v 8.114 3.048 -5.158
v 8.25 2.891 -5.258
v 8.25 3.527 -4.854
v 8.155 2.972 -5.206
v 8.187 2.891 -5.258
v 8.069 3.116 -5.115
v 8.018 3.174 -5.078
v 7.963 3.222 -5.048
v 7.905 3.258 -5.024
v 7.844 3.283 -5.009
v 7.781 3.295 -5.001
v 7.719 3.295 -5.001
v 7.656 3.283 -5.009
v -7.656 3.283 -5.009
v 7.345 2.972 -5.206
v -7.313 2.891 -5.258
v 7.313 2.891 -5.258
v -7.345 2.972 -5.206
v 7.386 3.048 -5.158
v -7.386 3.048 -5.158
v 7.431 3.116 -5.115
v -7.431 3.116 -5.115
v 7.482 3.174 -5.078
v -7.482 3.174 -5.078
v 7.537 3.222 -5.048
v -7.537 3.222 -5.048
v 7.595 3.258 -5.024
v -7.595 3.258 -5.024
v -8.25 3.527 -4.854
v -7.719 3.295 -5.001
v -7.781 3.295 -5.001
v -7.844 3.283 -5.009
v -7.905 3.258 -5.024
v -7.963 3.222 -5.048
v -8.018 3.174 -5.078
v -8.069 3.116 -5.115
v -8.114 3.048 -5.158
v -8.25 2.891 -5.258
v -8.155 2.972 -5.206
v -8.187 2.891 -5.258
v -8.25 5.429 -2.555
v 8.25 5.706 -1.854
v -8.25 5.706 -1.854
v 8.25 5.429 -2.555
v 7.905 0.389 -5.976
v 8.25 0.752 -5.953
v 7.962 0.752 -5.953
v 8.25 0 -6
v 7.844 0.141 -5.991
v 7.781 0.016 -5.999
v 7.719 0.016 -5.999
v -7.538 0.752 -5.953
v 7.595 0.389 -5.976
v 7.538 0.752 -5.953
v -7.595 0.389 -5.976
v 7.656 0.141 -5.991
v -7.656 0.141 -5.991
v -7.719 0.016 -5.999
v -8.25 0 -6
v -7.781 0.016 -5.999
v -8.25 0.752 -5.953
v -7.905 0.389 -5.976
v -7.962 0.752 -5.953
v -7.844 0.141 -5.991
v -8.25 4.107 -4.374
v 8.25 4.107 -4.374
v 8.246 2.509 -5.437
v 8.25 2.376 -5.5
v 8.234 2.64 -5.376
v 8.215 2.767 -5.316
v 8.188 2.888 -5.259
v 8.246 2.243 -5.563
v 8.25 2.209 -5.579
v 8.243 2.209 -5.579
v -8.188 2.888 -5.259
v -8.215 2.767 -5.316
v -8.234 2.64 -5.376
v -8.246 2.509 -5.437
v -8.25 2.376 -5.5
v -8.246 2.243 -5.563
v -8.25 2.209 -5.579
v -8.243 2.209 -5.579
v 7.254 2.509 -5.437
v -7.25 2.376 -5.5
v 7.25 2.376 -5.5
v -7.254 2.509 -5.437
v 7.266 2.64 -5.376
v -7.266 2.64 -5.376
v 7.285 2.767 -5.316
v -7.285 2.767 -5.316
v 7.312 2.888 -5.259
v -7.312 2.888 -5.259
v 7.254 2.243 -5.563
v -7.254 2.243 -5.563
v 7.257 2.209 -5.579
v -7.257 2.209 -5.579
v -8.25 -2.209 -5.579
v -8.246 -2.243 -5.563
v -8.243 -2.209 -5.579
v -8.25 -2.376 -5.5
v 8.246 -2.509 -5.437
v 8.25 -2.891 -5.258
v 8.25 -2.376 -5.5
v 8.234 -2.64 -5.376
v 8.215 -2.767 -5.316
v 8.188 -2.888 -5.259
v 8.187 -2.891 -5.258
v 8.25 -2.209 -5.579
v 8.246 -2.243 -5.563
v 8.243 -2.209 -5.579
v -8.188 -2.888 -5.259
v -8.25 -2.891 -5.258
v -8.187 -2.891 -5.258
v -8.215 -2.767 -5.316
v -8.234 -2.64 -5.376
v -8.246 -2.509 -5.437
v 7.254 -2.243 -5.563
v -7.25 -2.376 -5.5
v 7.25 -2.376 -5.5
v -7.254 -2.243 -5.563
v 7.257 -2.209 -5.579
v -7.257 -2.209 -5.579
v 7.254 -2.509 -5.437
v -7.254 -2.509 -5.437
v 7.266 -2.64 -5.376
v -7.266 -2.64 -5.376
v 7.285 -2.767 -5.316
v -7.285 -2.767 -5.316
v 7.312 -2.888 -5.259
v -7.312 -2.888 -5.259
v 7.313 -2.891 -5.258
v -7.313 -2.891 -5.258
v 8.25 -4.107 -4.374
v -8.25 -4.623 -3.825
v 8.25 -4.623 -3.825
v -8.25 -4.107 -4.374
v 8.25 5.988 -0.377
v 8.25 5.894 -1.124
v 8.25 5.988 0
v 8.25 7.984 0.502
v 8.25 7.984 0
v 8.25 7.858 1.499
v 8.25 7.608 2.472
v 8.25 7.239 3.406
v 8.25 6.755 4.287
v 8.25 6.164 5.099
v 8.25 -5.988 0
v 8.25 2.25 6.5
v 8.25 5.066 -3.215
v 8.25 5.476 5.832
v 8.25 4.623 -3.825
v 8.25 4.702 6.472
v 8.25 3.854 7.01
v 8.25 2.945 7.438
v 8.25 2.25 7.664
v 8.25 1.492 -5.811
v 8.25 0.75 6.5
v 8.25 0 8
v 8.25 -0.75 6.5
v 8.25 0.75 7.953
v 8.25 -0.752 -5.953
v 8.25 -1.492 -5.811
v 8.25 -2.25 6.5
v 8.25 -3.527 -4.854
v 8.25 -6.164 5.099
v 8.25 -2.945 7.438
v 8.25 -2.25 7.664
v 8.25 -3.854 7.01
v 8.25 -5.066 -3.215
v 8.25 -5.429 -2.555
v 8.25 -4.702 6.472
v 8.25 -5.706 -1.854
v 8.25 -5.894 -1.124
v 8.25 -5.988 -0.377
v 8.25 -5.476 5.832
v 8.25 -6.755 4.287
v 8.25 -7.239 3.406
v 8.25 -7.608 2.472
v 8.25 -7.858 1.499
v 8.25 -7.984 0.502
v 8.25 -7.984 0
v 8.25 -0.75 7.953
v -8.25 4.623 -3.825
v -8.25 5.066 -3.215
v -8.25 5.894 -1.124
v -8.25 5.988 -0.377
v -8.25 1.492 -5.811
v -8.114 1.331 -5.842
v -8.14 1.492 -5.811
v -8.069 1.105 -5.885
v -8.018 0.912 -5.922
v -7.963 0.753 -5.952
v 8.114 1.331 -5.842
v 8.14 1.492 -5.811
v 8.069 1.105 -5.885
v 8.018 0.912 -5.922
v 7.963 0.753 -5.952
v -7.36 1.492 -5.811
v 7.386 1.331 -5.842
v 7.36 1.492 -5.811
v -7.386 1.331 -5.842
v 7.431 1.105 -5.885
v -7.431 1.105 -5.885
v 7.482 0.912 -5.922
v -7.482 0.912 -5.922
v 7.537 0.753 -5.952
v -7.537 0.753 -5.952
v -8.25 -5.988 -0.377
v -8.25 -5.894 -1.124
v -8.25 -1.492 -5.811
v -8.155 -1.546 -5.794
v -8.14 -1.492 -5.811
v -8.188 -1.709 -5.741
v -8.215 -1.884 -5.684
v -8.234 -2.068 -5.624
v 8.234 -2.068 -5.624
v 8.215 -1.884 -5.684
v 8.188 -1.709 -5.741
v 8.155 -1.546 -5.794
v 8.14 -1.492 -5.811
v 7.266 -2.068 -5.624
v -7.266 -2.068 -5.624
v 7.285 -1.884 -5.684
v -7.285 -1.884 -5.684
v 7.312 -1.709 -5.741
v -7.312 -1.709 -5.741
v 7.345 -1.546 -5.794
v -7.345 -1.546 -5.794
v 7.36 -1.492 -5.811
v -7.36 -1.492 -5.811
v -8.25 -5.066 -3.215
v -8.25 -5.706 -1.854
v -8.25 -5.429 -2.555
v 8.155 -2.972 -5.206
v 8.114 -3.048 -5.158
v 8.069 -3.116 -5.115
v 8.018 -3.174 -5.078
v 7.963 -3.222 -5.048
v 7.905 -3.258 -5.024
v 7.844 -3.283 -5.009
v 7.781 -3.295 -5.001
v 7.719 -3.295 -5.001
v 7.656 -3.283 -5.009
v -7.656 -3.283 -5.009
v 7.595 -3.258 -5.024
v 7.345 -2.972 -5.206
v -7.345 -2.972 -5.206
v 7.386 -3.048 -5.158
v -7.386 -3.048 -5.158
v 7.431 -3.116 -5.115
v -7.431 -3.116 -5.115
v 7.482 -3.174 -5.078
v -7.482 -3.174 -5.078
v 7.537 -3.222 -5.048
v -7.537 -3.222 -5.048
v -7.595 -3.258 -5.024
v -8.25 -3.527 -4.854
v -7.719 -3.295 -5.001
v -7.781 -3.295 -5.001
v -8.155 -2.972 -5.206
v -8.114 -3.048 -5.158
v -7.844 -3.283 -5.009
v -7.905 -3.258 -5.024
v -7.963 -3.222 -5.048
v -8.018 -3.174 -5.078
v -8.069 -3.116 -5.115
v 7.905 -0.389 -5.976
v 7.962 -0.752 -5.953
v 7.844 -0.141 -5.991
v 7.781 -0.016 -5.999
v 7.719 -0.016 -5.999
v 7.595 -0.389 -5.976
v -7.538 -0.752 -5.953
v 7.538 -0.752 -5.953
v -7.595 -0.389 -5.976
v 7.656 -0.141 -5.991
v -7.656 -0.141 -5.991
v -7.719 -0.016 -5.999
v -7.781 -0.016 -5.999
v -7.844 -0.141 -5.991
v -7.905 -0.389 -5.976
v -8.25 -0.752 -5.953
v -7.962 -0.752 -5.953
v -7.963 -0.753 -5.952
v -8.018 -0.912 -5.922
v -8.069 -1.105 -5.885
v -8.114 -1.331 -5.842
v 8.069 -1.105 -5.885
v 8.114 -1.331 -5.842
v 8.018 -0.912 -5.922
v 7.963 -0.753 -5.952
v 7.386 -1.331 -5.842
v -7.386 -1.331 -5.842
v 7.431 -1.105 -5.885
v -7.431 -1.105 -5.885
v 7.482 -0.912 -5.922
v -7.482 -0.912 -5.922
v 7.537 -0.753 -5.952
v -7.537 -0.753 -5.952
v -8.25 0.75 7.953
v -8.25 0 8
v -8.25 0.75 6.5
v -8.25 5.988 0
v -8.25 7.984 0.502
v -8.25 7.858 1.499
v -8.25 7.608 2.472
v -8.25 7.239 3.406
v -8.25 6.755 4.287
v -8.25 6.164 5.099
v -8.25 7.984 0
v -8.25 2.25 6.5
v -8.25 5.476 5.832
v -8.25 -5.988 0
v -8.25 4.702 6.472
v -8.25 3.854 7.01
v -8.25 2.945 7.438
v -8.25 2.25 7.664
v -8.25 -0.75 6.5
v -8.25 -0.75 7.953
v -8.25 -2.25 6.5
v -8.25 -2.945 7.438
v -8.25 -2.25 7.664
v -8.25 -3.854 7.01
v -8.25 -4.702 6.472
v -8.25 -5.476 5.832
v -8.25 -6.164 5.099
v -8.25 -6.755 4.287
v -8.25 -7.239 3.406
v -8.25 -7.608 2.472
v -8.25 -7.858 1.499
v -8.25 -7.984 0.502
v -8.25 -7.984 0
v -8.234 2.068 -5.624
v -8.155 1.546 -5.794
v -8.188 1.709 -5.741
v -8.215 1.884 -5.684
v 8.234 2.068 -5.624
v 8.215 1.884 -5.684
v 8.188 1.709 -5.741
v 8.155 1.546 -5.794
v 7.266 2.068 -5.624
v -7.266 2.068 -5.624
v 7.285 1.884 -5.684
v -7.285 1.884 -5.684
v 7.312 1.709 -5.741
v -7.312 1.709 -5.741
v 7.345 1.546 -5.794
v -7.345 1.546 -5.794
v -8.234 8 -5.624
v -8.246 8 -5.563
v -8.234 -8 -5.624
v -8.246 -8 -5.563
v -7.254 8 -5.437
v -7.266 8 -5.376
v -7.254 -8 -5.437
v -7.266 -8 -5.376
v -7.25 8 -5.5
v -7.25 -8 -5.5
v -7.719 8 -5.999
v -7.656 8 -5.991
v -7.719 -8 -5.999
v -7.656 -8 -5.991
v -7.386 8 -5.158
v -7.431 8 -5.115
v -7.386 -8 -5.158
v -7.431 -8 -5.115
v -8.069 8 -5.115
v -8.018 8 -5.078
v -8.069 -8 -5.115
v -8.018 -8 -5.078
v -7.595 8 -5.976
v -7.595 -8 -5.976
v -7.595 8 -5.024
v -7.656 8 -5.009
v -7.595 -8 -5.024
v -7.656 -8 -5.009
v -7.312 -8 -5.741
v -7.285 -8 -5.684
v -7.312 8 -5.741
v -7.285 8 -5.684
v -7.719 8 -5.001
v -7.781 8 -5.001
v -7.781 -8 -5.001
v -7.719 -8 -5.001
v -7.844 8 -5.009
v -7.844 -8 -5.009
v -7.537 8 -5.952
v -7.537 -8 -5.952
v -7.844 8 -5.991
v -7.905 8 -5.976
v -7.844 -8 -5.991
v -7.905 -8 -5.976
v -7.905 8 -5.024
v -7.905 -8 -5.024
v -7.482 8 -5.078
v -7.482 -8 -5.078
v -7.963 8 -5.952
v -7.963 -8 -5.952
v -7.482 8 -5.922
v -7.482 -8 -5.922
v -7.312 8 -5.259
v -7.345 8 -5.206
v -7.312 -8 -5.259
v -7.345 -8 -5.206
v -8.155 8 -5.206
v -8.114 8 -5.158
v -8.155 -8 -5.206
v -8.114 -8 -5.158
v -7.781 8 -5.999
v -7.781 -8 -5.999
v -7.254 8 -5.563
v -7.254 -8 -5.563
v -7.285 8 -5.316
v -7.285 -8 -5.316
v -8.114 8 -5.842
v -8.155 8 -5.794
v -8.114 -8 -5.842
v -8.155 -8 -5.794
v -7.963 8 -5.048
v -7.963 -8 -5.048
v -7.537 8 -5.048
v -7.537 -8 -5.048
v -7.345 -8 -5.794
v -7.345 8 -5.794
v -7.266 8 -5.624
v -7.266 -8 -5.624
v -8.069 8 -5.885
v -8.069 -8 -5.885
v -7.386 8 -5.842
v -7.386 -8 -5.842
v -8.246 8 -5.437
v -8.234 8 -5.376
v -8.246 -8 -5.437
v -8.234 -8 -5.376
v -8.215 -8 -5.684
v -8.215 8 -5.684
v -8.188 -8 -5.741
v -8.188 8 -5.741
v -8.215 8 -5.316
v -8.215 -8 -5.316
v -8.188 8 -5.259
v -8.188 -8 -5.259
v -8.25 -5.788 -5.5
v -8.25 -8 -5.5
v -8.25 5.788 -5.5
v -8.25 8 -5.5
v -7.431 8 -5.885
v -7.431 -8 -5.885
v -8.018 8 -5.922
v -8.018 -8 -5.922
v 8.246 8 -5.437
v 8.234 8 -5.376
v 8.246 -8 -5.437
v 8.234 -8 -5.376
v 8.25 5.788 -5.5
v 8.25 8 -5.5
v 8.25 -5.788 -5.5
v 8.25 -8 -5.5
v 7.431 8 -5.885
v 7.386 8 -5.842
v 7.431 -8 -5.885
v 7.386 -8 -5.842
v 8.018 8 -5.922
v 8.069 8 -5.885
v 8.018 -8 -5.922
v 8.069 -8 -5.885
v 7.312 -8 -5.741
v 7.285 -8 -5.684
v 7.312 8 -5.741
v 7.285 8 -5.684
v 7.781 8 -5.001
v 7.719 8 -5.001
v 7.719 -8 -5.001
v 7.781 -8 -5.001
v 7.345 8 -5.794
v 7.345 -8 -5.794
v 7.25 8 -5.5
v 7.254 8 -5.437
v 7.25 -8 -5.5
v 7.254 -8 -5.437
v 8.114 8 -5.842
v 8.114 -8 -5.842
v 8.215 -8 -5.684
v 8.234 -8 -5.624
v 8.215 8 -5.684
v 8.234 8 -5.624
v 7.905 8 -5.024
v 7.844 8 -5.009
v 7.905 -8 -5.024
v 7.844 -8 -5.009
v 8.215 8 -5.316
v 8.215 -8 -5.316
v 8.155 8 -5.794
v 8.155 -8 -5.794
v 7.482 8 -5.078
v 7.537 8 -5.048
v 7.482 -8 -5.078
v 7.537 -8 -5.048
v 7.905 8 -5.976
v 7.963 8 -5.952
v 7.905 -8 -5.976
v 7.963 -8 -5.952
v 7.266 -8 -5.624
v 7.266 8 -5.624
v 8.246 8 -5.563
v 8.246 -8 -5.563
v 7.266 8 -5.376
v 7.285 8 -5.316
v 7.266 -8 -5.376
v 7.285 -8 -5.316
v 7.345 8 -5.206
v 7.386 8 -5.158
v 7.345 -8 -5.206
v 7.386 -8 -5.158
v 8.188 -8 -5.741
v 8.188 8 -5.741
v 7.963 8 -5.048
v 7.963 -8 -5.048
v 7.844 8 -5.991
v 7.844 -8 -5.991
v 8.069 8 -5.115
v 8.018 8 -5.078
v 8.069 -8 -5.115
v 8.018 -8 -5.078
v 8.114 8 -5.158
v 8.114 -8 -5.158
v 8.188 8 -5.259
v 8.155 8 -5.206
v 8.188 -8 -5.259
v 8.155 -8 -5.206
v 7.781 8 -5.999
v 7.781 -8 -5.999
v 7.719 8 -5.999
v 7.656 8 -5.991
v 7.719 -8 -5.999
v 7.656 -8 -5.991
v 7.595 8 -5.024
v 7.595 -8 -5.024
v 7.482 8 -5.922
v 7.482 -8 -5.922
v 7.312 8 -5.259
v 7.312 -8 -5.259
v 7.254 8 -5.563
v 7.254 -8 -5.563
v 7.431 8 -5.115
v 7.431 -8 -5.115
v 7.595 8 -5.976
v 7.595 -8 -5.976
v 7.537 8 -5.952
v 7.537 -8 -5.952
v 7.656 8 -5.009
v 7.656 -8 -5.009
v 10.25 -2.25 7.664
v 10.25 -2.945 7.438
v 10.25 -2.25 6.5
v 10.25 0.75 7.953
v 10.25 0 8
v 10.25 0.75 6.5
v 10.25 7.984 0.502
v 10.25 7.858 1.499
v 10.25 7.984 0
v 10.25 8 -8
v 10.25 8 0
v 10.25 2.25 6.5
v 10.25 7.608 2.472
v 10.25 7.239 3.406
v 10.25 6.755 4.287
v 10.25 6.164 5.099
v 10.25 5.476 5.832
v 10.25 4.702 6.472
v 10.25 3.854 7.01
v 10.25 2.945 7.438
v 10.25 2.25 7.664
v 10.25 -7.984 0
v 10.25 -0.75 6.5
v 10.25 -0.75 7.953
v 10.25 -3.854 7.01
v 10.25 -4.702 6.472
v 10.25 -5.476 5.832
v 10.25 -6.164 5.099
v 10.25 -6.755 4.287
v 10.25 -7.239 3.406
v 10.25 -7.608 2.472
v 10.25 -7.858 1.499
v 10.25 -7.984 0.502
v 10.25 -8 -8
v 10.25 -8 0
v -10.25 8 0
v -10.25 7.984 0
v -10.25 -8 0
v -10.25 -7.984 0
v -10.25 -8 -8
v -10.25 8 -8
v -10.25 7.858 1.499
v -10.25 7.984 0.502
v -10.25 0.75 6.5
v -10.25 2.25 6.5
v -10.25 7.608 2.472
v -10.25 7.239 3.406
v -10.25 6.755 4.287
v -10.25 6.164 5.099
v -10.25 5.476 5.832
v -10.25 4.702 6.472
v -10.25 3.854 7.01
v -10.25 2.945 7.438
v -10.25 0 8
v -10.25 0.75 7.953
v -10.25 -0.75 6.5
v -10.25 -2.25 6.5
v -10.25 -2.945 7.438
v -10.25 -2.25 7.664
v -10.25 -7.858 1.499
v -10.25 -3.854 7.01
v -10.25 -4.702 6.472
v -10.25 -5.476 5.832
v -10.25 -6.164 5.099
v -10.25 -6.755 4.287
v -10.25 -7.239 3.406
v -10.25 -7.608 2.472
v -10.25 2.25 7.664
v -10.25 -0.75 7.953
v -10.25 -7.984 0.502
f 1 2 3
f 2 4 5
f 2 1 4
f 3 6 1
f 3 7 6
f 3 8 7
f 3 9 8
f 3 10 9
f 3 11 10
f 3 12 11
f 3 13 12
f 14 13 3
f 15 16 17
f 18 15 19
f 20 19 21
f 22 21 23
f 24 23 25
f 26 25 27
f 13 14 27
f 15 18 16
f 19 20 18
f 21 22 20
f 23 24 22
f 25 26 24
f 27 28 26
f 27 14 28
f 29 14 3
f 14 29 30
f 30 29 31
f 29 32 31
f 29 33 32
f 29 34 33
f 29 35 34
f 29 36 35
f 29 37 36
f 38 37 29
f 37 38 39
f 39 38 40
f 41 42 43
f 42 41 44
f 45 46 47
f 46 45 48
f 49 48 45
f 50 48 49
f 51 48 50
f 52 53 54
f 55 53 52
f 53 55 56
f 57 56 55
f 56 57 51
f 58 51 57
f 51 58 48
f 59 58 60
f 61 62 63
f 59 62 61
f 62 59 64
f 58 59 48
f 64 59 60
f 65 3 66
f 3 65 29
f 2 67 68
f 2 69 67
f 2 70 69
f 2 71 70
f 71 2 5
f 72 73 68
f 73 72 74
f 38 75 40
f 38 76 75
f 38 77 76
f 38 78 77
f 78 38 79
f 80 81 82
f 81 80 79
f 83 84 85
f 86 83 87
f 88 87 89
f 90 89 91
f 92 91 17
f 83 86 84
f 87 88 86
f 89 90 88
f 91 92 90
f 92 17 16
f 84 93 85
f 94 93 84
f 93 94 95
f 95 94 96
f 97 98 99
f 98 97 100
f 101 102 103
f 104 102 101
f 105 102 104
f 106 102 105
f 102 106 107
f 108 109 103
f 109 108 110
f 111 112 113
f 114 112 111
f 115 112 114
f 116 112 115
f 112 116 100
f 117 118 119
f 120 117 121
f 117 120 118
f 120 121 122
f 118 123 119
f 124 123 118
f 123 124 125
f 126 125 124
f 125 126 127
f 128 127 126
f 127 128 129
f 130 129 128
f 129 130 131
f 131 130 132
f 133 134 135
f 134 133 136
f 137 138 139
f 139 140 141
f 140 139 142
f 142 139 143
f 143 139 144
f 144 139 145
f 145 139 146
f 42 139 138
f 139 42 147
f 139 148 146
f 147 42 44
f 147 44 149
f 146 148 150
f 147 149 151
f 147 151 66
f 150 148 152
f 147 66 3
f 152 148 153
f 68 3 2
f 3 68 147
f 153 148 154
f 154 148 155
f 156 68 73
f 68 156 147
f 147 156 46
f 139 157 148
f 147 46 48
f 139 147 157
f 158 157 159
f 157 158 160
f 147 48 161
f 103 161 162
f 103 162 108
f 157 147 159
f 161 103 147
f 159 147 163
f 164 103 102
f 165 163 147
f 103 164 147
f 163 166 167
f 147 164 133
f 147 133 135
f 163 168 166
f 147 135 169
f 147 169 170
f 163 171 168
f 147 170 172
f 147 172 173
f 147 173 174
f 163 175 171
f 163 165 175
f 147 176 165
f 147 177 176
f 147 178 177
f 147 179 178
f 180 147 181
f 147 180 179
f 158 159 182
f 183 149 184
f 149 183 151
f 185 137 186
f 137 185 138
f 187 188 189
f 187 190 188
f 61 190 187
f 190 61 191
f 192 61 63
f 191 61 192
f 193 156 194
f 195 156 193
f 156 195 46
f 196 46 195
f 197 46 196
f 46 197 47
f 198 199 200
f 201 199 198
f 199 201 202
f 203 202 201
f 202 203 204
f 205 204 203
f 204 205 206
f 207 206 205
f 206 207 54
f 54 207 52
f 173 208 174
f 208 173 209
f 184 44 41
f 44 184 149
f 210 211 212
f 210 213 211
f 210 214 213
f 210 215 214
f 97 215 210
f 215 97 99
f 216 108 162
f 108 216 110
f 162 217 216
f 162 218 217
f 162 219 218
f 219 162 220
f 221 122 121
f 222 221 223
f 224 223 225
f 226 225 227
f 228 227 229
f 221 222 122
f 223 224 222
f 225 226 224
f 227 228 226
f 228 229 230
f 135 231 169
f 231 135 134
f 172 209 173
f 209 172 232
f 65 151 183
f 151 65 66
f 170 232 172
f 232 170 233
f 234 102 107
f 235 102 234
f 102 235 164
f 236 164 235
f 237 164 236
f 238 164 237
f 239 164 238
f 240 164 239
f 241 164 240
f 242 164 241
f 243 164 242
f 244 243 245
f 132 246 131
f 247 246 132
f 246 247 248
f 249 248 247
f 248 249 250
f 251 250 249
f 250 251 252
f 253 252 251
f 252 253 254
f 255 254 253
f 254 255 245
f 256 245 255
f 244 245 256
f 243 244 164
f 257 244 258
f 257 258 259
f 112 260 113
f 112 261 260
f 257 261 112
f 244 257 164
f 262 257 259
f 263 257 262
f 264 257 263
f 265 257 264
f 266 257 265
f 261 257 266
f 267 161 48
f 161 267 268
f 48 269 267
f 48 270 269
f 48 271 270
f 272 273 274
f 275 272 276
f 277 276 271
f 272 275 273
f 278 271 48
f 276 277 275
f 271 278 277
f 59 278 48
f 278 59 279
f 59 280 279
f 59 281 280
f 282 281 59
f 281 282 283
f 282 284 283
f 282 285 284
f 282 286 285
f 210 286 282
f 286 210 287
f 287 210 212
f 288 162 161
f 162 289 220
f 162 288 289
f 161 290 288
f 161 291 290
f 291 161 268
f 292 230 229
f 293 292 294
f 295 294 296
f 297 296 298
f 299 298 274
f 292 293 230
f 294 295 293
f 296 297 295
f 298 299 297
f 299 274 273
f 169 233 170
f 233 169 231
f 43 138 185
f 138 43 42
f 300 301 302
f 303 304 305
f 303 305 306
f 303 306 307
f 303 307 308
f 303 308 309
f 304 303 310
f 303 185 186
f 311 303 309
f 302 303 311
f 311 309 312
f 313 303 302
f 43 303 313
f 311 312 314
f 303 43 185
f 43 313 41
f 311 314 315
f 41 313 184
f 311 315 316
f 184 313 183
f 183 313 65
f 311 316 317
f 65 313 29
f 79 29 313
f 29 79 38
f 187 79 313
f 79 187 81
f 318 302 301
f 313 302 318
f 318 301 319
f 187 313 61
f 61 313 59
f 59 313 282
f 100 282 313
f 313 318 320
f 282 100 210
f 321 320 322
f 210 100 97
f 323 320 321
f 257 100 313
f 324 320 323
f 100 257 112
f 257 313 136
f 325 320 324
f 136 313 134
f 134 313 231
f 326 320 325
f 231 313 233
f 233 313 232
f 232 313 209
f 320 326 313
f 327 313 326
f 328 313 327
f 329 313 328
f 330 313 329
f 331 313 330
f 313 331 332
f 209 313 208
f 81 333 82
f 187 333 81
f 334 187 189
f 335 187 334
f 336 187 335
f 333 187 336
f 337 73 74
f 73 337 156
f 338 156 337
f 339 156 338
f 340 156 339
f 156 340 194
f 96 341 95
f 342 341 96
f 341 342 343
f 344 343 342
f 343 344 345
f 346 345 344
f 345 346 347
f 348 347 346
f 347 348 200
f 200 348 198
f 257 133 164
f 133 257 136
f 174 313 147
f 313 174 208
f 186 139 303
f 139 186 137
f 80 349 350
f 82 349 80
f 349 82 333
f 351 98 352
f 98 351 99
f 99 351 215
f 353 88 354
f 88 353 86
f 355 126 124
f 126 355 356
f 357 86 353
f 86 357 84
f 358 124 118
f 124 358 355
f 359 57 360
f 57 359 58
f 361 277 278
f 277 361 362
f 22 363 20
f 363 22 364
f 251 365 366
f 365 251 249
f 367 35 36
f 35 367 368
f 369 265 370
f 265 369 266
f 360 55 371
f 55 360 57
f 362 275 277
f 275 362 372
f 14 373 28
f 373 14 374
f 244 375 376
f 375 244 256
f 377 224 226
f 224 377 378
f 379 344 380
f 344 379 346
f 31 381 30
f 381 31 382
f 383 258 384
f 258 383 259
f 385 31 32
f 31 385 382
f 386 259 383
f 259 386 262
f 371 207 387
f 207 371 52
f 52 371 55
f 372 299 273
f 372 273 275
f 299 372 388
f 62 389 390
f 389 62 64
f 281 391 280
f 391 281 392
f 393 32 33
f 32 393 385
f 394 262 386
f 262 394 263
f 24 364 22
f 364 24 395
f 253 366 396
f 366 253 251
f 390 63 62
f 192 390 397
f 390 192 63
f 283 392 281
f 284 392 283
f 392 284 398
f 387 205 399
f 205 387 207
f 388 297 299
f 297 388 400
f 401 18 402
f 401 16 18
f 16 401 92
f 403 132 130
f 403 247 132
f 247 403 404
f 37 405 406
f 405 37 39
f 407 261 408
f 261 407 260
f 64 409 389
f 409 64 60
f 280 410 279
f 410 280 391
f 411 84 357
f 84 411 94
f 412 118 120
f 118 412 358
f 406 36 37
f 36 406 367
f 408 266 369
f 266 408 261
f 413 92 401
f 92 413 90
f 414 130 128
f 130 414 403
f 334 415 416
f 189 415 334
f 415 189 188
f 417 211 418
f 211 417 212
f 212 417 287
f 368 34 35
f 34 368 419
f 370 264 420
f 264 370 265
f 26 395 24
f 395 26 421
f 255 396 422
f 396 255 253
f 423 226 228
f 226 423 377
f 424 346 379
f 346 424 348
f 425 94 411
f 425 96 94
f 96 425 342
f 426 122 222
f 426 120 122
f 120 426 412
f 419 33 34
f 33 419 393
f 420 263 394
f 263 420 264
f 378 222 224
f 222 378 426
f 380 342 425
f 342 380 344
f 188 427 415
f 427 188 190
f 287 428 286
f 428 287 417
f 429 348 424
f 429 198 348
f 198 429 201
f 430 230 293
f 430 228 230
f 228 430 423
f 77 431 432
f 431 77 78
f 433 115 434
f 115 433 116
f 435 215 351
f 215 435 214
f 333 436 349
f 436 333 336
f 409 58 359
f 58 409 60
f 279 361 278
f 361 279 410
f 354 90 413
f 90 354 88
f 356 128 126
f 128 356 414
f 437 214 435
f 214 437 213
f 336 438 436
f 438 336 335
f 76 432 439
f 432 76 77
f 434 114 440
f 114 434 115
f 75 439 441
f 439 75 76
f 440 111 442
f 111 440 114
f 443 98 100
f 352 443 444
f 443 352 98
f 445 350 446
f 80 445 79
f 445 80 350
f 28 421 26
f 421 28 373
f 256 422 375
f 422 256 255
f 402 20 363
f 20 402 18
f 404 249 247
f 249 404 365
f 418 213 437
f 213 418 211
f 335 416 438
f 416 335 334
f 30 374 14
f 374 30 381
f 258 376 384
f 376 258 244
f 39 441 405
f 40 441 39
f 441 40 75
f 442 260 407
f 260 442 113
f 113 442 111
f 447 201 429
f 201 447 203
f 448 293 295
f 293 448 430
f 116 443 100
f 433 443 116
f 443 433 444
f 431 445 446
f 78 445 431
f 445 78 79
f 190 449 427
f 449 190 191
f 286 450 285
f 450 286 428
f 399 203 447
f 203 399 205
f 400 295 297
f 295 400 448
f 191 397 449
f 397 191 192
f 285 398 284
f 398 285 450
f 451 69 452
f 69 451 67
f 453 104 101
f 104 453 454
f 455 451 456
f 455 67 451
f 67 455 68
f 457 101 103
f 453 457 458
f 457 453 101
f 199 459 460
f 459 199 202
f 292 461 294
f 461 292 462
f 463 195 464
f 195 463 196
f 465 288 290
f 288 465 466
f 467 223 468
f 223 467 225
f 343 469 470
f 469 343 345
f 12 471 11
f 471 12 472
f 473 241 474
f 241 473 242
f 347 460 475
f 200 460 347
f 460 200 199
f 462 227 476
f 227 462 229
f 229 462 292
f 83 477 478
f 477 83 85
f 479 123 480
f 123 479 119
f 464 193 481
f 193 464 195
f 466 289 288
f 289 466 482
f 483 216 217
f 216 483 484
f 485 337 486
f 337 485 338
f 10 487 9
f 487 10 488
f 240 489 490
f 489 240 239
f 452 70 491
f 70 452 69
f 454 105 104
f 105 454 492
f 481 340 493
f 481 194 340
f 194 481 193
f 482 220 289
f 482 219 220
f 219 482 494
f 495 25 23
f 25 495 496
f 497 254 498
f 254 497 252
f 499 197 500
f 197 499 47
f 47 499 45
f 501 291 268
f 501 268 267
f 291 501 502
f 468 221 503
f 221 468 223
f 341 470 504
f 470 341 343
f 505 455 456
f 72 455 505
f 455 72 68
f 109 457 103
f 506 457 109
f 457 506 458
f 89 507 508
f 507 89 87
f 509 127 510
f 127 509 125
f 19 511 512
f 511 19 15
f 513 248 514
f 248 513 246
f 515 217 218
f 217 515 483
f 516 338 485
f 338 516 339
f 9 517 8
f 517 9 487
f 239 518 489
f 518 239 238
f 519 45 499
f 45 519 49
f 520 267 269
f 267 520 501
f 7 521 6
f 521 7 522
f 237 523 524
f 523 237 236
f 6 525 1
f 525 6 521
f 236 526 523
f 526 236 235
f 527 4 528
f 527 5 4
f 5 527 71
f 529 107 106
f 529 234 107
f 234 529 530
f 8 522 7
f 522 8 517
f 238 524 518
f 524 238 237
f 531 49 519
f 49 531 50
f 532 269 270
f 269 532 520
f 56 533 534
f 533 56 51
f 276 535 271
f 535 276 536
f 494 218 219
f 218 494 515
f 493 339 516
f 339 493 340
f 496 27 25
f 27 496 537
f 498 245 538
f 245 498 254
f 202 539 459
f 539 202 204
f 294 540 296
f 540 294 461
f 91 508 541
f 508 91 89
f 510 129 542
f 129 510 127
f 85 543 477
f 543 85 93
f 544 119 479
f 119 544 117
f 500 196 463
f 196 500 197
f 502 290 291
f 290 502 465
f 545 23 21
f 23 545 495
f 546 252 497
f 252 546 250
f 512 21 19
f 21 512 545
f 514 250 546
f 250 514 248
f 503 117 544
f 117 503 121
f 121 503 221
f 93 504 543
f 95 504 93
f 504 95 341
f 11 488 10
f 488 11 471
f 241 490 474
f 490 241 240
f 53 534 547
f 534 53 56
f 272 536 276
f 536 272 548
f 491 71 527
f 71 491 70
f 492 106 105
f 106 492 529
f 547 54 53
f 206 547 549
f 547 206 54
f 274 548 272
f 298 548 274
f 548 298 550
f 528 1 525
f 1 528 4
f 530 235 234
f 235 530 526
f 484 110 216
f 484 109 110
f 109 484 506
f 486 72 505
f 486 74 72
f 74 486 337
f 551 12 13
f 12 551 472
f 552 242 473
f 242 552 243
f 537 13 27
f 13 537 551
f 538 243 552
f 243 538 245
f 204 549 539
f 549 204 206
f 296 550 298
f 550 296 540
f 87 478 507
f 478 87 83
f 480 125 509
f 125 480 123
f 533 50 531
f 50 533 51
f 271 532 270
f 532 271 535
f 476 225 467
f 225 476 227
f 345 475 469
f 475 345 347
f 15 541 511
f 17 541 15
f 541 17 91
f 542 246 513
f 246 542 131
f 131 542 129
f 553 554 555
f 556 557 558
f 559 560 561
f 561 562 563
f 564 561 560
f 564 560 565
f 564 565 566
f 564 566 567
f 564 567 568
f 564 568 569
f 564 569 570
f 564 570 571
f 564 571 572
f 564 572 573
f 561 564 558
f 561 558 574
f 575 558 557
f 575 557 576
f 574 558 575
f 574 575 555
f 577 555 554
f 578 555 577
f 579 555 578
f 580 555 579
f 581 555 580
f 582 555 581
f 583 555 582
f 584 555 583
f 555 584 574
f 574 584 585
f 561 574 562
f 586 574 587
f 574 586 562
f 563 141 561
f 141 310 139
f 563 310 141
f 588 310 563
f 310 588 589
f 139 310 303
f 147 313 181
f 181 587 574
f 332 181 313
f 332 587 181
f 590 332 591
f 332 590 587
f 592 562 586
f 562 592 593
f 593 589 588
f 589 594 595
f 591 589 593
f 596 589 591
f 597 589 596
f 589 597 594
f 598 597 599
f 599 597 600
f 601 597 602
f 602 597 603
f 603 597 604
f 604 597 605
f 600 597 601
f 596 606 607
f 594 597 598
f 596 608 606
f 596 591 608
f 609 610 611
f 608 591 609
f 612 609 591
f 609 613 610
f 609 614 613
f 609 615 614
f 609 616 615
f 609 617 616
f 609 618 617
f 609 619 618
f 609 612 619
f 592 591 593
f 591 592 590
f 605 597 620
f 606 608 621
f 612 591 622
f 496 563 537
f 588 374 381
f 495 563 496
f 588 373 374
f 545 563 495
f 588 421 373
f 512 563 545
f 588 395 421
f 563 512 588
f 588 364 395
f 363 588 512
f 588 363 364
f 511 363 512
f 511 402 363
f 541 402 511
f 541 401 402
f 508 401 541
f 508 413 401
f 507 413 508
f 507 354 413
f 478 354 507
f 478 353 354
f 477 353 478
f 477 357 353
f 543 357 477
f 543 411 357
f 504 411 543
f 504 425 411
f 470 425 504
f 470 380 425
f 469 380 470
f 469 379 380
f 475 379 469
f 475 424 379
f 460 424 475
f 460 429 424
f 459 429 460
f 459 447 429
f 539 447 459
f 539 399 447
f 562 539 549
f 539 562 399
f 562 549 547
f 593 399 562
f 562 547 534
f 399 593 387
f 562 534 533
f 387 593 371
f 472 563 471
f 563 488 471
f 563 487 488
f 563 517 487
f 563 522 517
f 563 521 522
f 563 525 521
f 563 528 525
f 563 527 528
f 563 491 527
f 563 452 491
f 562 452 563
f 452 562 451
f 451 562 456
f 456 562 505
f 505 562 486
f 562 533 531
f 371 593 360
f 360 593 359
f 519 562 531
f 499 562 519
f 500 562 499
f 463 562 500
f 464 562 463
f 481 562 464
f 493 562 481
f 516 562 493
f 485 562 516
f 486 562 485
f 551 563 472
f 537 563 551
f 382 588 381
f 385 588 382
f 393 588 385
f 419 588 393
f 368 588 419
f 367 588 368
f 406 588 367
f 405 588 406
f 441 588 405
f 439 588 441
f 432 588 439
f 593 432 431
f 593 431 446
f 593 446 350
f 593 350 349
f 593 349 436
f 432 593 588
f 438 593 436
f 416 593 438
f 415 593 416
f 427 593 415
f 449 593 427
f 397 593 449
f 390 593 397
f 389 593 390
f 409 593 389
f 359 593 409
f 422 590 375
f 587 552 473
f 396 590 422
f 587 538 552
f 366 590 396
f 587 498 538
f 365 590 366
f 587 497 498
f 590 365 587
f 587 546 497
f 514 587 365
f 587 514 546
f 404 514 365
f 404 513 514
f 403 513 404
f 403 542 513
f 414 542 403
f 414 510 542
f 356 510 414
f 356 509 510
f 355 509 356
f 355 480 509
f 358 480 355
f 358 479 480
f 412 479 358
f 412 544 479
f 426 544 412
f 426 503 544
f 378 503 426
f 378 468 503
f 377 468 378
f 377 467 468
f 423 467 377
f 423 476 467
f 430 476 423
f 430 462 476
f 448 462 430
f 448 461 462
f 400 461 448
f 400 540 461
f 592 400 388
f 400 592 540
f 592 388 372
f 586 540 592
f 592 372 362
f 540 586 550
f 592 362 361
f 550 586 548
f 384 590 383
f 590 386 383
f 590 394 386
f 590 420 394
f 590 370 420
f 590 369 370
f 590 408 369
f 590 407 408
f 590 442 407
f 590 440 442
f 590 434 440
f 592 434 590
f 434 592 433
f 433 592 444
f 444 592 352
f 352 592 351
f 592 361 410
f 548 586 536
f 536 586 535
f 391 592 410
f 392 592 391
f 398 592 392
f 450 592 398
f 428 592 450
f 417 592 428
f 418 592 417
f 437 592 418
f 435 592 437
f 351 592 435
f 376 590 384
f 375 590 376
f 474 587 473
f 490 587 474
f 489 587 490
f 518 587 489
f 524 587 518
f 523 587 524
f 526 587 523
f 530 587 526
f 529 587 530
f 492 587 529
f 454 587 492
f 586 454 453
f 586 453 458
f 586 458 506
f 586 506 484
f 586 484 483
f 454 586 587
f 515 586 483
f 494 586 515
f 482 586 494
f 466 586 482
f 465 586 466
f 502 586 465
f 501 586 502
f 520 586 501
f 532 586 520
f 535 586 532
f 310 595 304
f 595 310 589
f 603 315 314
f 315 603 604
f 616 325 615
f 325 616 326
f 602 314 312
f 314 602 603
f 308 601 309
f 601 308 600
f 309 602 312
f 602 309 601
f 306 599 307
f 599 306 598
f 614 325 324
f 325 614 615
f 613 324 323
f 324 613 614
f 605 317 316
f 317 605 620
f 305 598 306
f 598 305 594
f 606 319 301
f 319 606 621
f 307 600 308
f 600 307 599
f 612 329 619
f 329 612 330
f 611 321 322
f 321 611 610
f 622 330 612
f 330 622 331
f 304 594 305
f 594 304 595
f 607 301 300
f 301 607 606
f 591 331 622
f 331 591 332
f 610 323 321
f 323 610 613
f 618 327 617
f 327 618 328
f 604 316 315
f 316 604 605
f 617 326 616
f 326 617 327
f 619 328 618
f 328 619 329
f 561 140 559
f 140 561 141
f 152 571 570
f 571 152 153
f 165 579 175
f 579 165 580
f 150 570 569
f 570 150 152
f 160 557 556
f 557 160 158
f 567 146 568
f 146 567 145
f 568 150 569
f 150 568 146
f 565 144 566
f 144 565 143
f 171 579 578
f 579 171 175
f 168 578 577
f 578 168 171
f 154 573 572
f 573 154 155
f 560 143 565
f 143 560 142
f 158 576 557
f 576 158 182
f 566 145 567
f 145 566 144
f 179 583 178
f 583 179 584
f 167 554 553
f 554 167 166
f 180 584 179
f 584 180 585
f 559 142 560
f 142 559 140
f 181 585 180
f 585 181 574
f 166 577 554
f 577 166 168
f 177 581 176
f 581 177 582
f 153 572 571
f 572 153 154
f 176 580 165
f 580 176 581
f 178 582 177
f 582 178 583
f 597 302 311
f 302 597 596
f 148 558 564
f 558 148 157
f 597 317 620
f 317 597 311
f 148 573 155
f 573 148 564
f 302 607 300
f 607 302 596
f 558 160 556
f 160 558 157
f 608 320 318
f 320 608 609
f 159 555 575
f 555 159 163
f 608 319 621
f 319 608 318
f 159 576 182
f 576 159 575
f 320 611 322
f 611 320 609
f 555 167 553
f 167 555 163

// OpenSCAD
battery_diam = 12;
battery_width = 5.5;
battery_count = 3;
wire_hole_diam = 1;
wire_hook_width = 1.5;
wire_hook_height = 1.5;

///

$fn=50;
length = battery_width * battery_count;

union() {
	difference() {
		union() {
			translate([-length/2-2,-battery_diam/2-2,-battery_diam/2-2]) cube([length+4, battery_diam+4, battery_diam/2+2]);
		}

		union() {
			translate([0,0,0]) rotate(90, [0,1,0]) cylinder(r=battery_diam/2, h=length, center=true);
			translate([-length/2+wire_hole_diam/2,0,-battery_diam/2+wire_hole_diam/2]) rotate(90, [1,0,0]) cylinder(r=wire_hole_diam/2, h=battery_diam+6, center=true);
			translate([length/2-wire_hole_diam/2,0,-battery_diam/2+wire_hole_diam/2]) rotate(90, [1,0,0]) cylinder(r=wire_hole_diam/2, h=battery_diam+6, center=true);
		}
	}

	difference() {
		union() {
			translate([-length/2-2, 0, 0]) rotate(90, [0,1,0]) cylinder(r=battery_diam/2+2, h=2);
			translate([+length/2, 0, 0]) rotate(90, [0,1,0]) cylinder(r=battery_diam/2+2, h=2);
		}

		union() {
			translate([0,wire_hook_width,battery_diam/2+2-wire_hook_height/2]) cube([length+5,wire_hook_width,wire_hook_height], center=true);
			translate([0,-wire_hook_width,battery_diam/2+2-wire_hook_height/2]) cube([length+5,wire_hook_width,wire_hook_height], center=true);
		}
	}
}
